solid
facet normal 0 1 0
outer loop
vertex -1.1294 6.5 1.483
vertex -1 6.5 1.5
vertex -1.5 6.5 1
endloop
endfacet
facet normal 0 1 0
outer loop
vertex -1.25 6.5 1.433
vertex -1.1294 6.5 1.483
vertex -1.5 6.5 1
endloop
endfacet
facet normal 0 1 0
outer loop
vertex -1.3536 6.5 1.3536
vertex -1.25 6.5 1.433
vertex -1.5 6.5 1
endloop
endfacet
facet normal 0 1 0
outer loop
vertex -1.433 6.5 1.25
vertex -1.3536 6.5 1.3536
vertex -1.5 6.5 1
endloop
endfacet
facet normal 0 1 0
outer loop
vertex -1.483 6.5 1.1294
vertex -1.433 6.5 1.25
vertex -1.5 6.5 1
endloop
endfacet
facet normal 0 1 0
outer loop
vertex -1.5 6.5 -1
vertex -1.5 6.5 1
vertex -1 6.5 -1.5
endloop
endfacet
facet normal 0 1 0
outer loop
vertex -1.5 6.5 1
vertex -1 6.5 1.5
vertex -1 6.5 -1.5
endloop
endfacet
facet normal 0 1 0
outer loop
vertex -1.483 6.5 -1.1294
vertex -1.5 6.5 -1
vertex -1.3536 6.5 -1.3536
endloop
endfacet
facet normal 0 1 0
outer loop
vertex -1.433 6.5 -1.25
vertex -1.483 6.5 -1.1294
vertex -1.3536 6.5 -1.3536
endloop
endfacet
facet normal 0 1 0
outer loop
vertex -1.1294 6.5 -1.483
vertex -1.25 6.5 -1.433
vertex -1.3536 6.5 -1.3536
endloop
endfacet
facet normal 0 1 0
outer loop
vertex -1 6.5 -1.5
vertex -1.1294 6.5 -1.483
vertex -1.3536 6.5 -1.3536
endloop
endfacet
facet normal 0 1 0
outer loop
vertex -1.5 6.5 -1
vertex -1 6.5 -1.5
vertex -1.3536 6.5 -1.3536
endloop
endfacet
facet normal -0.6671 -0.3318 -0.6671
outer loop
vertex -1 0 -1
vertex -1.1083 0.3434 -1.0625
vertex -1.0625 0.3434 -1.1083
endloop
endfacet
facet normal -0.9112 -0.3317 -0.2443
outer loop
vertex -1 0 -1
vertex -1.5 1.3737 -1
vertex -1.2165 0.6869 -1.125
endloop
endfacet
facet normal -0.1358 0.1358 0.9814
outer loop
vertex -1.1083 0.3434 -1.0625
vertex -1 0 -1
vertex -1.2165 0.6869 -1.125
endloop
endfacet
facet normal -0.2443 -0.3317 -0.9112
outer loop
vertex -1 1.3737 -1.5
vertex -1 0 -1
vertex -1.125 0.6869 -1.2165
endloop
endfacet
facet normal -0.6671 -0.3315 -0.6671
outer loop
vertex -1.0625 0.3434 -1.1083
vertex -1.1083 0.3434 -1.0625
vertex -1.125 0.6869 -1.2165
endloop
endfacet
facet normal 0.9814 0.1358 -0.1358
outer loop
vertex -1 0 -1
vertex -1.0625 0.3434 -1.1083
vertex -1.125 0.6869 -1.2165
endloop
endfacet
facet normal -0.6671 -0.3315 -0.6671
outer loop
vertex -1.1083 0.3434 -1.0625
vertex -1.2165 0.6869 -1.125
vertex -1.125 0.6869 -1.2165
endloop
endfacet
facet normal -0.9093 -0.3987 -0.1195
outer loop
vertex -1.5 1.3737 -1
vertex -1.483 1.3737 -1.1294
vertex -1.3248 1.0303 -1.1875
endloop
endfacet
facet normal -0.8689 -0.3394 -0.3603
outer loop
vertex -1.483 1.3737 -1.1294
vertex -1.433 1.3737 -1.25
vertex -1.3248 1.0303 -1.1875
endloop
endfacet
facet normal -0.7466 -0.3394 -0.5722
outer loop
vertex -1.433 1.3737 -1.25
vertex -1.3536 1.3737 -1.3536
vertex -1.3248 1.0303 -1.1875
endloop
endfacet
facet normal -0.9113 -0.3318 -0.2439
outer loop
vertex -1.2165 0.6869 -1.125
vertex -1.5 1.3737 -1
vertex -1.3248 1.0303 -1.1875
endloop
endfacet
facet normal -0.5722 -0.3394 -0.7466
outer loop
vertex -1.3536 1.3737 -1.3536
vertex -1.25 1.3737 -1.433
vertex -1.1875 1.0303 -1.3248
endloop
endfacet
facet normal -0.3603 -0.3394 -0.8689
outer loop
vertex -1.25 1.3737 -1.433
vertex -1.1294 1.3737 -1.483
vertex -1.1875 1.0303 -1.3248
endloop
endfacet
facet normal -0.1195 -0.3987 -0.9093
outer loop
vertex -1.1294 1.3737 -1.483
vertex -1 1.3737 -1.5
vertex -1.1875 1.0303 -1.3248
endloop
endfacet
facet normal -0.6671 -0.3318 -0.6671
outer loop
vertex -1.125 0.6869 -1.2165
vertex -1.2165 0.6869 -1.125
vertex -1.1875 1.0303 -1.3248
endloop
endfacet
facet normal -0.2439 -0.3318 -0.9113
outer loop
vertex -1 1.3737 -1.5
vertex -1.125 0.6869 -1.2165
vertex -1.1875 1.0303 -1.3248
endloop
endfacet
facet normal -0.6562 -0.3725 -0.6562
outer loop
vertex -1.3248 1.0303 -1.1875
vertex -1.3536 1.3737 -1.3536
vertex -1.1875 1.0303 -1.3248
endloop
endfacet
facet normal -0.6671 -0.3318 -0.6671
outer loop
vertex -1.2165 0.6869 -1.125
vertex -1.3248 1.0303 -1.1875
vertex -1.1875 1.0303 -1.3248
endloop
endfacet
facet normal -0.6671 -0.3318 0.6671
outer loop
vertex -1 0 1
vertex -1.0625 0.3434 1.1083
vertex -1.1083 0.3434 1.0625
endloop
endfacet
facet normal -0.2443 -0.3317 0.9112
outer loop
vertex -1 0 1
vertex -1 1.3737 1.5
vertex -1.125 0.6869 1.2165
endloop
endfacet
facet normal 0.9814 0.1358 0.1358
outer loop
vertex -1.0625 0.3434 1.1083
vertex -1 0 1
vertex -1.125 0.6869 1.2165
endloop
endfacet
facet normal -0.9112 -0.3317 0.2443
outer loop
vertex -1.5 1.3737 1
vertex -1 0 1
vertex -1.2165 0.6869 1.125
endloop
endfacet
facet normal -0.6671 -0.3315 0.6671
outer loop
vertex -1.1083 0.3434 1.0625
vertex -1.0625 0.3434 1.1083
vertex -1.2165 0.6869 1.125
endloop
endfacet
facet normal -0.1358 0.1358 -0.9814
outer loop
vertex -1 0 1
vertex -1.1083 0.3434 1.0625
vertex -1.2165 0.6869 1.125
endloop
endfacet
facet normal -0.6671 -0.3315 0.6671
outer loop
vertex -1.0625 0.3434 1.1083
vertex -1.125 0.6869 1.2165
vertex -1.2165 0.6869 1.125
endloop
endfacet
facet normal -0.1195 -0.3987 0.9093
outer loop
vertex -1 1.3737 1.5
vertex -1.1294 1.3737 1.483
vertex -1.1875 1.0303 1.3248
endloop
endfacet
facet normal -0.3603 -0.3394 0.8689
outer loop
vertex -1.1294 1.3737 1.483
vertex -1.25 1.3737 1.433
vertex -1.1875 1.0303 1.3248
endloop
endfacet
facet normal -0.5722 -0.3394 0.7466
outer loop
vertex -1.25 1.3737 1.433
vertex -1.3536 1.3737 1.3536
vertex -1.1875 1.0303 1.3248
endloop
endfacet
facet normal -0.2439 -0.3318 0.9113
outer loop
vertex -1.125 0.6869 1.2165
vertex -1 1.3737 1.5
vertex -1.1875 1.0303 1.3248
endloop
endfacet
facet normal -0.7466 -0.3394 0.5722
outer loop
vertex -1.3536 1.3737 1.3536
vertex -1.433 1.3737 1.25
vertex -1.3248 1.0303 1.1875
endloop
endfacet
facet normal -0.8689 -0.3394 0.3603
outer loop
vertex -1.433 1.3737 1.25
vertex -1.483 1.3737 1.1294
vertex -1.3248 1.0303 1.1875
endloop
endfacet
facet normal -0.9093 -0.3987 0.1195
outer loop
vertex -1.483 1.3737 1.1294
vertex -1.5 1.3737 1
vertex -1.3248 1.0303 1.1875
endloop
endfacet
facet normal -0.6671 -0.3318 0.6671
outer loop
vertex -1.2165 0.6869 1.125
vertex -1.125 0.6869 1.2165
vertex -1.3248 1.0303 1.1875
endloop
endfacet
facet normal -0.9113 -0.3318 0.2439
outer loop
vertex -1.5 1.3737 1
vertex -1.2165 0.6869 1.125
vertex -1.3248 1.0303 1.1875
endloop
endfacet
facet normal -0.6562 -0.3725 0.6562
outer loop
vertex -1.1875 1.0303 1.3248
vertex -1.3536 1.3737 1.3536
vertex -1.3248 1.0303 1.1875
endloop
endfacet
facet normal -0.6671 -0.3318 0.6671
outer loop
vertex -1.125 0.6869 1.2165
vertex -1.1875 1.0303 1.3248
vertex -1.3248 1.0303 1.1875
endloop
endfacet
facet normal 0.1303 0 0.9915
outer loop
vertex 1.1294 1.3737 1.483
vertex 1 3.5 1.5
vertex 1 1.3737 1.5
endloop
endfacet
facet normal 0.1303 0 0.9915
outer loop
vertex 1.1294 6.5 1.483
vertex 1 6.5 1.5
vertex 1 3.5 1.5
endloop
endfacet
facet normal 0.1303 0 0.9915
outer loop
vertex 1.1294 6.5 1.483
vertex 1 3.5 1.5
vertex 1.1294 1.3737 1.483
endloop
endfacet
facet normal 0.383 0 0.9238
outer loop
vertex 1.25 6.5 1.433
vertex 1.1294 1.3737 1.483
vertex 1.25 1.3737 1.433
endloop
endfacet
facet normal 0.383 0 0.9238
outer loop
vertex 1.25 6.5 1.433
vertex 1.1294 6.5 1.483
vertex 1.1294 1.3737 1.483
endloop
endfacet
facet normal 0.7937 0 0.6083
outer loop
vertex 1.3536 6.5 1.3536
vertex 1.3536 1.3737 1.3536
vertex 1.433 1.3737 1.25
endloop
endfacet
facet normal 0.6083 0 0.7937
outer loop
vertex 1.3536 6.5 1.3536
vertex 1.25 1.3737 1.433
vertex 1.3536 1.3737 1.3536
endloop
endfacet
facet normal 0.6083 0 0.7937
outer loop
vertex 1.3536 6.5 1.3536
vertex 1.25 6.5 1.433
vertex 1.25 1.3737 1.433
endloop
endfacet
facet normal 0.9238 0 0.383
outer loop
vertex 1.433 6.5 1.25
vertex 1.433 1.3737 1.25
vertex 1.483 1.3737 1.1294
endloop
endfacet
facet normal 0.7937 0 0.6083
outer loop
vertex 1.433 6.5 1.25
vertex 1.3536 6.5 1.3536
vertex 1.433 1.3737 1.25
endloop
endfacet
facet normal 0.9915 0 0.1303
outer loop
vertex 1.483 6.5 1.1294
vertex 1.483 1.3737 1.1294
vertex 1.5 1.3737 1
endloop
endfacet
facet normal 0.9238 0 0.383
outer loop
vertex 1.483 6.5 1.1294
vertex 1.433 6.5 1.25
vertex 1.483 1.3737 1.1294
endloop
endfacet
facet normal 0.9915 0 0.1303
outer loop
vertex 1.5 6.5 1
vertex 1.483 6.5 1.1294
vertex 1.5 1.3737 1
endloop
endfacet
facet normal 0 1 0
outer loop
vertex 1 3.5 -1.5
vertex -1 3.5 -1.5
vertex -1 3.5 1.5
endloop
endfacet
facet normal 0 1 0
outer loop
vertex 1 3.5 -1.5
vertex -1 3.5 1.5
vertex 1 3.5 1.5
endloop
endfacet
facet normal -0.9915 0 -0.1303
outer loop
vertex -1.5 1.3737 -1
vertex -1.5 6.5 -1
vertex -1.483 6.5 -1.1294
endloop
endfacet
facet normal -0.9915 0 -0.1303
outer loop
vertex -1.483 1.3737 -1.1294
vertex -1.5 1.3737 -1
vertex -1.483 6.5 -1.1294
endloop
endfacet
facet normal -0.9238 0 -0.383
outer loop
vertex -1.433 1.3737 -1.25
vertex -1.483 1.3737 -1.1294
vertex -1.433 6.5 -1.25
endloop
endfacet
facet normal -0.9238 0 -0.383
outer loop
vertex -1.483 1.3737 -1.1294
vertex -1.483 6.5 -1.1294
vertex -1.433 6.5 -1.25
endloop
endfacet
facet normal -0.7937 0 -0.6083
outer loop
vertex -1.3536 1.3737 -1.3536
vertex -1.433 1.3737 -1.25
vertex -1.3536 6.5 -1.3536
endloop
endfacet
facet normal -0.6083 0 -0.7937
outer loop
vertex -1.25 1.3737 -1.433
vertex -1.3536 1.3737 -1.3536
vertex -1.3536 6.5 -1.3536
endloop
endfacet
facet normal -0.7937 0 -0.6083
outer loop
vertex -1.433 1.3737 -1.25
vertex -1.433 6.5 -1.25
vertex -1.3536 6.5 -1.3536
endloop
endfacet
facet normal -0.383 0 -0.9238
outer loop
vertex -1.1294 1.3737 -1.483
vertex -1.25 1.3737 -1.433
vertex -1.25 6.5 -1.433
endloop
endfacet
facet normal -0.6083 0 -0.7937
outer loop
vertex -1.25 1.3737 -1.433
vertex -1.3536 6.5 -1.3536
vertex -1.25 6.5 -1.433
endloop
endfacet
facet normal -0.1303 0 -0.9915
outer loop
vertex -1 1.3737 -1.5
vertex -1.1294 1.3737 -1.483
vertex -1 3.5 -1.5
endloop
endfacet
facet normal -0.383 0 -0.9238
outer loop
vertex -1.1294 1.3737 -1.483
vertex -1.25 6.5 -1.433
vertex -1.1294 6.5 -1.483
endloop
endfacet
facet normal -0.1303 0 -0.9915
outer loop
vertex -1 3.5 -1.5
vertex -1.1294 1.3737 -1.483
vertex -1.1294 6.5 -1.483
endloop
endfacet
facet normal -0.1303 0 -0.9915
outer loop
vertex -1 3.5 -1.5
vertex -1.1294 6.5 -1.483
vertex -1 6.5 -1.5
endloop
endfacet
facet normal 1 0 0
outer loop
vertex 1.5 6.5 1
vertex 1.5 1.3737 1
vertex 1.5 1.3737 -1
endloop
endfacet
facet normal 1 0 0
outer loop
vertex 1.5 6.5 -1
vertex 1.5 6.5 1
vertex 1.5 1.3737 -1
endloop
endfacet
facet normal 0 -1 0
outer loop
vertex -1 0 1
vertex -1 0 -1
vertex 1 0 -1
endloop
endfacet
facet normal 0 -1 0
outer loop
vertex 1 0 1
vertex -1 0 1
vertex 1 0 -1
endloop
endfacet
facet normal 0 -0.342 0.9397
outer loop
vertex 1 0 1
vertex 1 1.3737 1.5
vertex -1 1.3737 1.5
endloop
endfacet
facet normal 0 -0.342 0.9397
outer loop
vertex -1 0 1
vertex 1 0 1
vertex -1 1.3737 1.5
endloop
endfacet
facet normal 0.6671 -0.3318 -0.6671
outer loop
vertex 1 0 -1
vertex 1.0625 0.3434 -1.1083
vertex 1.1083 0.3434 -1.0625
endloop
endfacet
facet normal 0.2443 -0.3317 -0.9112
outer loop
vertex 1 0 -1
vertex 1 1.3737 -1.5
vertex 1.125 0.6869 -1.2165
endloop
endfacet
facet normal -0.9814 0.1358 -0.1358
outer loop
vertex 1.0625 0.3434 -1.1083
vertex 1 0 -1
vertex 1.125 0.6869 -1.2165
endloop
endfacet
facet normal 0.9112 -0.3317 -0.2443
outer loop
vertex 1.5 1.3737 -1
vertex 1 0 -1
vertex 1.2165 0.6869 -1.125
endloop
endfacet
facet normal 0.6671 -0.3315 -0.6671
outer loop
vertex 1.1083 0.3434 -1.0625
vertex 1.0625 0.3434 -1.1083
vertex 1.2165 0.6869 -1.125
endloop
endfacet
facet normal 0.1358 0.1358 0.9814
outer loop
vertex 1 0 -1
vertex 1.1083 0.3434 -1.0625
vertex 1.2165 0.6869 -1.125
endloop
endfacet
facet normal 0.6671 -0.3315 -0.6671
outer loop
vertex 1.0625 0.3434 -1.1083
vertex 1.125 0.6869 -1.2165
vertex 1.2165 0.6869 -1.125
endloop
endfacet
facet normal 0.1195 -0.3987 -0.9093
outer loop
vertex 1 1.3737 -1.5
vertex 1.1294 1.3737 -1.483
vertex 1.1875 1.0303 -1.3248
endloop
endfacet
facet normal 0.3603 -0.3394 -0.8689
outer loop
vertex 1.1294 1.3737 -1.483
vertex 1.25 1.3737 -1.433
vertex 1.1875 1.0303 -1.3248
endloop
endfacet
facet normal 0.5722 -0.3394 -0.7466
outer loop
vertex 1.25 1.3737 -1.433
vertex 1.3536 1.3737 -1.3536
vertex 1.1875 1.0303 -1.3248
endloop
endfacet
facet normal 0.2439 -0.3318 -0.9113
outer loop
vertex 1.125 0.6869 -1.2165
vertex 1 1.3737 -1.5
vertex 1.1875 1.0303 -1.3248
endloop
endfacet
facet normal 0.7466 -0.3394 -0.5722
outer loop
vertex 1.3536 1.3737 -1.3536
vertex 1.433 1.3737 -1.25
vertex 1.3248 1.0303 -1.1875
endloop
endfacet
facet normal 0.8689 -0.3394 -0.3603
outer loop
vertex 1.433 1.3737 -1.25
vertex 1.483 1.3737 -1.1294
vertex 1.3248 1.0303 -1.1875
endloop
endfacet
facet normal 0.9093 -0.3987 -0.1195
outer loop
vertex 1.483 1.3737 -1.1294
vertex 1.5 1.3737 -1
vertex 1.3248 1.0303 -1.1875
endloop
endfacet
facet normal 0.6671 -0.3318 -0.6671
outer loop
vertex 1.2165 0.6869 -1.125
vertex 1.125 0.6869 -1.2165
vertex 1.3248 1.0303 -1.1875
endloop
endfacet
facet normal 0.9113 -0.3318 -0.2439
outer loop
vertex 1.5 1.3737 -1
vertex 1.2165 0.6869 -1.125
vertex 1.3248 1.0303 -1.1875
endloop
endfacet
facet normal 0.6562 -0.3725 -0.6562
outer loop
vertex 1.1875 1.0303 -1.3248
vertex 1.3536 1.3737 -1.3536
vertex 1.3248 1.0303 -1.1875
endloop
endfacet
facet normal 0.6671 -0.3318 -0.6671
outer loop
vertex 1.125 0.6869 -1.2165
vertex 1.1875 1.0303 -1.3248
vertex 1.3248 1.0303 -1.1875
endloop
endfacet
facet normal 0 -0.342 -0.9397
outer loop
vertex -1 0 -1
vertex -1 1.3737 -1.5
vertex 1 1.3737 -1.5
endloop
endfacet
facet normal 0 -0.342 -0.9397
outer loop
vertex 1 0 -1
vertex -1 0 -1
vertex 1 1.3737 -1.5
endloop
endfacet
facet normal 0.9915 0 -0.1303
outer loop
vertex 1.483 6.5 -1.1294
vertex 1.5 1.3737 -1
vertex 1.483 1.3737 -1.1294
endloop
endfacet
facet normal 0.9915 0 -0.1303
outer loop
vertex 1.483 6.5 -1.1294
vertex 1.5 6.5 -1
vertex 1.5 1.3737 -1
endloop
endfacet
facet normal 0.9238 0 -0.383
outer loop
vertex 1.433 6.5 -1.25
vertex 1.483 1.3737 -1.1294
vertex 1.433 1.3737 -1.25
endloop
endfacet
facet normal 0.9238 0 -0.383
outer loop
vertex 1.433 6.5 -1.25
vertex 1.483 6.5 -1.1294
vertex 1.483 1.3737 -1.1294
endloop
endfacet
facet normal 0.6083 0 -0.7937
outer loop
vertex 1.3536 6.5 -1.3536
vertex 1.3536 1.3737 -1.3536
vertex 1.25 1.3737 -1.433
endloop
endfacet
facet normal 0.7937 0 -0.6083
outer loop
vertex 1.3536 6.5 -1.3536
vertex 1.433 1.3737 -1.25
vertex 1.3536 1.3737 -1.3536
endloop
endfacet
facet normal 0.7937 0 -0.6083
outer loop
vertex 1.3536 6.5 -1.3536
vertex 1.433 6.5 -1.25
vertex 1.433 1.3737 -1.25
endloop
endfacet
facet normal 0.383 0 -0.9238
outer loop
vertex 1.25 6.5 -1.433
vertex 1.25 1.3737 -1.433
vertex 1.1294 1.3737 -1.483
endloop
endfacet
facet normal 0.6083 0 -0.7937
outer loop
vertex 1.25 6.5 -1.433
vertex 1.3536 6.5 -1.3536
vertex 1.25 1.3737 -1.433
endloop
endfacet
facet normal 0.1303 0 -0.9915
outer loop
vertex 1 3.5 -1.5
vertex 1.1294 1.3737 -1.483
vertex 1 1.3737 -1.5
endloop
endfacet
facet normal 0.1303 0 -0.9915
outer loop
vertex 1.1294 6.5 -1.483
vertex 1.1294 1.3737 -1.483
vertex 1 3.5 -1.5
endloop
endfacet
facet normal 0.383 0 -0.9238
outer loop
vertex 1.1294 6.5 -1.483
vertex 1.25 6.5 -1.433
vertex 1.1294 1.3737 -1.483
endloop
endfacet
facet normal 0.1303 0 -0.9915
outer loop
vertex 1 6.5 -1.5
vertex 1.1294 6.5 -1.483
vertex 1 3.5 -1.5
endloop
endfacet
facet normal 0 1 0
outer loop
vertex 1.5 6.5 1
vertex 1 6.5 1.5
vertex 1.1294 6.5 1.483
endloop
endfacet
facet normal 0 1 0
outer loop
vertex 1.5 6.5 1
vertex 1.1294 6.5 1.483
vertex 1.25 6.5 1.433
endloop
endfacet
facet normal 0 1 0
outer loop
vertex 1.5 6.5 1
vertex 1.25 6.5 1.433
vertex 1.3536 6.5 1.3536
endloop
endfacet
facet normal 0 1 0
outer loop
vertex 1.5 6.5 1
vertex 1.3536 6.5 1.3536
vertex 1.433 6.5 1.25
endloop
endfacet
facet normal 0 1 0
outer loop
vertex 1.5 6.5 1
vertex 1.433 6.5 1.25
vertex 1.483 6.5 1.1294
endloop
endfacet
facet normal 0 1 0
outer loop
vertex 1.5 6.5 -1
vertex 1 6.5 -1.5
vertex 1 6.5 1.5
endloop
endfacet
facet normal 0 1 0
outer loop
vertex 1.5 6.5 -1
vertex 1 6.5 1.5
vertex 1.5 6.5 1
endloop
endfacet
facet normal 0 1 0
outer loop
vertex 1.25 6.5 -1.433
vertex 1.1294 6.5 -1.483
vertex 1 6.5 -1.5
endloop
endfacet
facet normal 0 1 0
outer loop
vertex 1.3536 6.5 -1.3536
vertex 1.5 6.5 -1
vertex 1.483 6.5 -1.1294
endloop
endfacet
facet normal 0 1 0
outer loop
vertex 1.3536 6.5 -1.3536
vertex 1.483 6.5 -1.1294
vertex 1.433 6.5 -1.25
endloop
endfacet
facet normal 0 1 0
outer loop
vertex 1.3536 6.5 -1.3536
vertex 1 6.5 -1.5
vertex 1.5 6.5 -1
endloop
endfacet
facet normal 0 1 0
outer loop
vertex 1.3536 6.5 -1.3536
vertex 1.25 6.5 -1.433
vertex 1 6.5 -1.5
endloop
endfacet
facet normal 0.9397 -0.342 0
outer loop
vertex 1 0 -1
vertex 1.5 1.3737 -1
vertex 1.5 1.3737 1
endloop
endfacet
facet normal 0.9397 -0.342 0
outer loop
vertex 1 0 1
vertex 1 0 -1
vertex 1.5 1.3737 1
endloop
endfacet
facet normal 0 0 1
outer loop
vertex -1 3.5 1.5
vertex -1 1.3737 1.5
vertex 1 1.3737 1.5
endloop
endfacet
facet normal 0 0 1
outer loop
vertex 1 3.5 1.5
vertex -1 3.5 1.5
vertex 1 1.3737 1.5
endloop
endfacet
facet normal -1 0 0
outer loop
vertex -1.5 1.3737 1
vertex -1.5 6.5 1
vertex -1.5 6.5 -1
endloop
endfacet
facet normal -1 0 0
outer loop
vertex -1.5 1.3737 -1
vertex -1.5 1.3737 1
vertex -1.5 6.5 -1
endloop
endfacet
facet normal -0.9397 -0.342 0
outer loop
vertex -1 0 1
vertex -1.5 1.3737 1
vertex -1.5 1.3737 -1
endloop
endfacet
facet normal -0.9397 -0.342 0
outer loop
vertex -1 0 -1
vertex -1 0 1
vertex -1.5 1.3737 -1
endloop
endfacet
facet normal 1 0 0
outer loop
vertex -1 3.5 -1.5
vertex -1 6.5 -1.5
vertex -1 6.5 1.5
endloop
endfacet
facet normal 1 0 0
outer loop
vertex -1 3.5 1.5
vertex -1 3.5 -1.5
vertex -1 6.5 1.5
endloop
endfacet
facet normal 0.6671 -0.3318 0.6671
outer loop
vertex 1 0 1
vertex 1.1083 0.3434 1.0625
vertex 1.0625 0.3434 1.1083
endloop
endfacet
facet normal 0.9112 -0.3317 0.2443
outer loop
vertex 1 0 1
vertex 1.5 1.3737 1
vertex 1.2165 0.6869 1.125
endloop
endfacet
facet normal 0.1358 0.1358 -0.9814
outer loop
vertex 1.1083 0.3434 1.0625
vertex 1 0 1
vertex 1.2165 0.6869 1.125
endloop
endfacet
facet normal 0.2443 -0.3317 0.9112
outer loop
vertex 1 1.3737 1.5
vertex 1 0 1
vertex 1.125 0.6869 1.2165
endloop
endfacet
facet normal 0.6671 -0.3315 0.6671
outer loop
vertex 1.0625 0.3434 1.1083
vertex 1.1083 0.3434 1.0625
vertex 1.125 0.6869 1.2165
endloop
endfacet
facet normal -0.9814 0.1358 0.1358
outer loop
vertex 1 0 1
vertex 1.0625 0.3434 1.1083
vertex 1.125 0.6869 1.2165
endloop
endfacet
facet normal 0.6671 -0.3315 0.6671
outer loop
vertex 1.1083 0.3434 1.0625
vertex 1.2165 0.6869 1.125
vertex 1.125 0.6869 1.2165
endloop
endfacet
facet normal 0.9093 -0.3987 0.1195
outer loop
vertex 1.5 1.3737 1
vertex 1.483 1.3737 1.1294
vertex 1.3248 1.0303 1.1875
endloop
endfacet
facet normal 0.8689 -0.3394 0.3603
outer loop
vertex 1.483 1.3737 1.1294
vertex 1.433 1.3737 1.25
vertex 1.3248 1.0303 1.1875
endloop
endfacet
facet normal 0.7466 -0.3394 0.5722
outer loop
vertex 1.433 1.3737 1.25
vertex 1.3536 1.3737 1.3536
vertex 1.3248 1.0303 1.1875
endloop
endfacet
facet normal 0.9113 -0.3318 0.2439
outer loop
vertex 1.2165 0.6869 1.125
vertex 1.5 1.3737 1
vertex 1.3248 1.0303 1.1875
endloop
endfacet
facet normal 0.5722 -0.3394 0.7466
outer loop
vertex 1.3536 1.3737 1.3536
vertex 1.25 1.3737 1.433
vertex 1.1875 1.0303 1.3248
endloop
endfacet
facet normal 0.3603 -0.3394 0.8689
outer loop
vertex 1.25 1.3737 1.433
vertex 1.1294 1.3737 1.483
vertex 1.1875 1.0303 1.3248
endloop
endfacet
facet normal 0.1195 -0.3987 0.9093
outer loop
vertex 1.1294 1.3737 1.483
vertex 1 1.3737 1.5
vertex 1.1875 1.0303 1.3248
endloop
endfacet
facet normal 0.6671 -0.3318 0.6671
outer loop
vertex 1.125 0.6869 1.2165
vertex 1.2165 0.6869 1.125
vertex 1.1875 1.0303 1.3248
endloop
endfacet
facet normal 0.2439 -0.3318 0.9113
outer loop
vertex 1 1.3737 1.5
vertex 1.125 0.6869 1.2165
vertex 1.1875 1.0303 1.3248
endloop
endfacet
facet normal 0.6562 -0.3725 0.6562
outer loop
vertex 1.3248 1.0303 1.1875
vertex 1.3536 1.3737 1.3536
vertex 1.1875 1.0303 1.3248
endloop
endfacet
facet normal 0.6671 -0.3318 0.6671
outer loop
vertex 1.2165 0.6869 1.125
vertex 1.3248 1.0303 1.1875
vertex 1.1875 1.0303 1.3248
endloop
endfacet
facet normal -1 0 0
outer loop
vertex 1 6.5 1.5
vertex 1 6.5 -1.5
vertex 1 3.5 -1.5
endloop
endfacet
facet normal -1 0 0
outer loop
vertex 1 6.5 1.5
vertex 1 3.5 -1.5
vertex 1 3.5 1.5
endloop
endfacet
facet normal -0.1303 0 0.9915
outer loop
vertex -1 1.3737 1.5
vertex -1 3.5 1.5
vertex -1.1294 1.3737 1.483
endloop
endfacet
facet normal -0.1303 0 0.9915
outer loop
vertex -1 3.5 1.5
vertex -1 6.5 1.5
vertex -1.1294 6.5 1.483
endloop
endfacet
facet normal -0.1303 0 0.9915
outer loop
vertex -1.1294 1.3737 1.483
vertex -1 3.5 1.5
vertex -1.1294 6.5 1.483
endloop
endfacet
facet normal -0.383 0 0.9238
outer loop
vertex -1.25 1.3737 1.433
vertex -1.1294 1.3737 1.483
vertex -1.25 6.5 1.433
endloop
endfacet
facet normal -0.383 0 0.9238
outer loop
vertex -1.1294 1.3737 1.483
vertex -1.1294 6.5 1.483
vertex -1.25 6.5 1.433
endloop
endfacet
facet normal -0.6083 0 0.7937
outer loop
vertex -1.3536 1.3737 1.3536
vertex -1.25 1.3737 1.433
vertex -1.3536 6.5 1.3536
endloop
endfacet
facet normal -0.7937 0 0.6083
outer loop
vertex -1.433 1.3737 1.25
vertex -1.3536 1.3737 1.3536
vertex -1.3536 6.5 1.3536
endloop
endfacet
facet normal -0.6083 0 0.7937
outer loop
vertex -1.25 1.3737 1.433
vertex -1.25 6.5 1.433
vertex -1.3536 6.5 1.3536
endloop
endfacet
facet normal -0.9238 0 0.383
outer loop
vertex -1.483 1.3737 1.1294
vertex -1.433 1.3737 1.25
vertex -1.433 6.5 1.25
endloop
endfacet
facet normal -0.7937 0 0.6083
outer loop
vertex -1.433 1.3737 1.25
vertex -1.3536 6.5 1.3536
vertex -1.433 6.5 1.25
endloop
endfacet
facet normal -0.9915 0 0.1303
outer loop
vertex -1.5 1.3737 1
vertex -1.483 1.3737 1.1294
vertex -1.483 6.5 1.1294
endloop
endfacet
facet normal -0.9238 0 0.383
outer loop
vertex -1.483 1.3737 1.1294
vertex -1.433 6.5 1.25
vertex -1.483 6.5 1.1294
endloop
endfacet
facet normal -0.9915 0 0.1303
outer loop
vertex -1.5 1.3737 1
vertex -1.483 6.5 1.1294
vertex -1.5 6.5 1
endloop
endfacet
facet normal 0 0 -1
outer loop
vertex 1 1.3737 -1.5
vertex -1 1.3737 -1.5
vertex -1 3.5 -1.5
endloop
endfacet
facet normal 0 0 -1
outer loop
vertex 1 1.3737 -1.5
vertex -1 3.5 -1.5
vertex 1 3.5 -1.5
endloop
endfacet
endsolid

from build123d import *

# Parameters (mm, degrees)
SKETCH1_W           = 3
SKETCH1_H           = 3
BOSS_EXTRUDE1_DEPTH = 3.5
FILLET1_R           = 0.5
CHAMFER1_SIZE       = 0.5
CHAMFER1_SIZE2      = 1.37373871
BOSS_EXTRUDE2_START = 3
BOSS_EXTRUDE2_DEPTH = 3


with BuildPart() as part:
    # Sketch1 → Boss-Extrude1 (new body)
    with BuildSketch(Plane(origin=(0, 0, 0), x_dir=(1, 0, 0), z_dir=(0, 1, 0))):
        Rectangle(SKETCH1_W, SKETCH1_H)
    extrude(amount=BOSS_EXTRUDE1_DEPTH)

    # Fillet1
    fillet1_edges = [part.edges().sort_by_distance(p)[0] for p in [
        (-1.5, 1.75, -1.5),
        (1.5, 1.75, -1.5),
        (1.5, 1.75, 1.5),
        (-1.5, 1.75, 1.5),
    ]]
    fillet(fillet1_edges, radius=FILLET1_R)

    # Chamfer1
    chamfer1_edges = [part.edges().sort_by_distance(p)[0] for p in [
        (-1.5, 0, 0),
        (0, 0, -1.5),
        (1.5, 0, 0),
        (0, 0, 1.5),
        (1.353553391, 0, 1.353553391),
        (-1.353553391, 0, 1.353553391),
        (1.353553391, 0, -1.353553391),
        (-1.353553391, 0, -1.353553391),
    ]]
    chamfer1_side = [part.faces().sort_by_distance(p)[0] for p in [
        (0, 0, 0),
    ]]
    chamfer(chamfer1_edges, length=CHAMFER1_SIZE, length2=CHAMFER1_SIZE2, reference=chamfer1_side[0])

    # Sketch2 → Boss-Extrude2 (add)
    with BuildSketch(Plane(origin=(0, 3.5, 0), x_dir=(1, 0, 0), z_dir=(0, 1, 0)).offset(BOSS_EXTRUDE2_START)):
        with BuildLine():
            Line((-1, 1.5), (-1, -1.5))
            ThreePointArc((-1, -1.5), (-1.353553391, -1.353553391), (-1.5, -1))
            Line((-1.5, -1), (-1.5, 1))
            ThreePointArc((-1.5, 1), (-1.353553391, 1.353553391), (-1, 1.5))
        make_face()
        with BuildLine():
            Line((1.5, -1), (1.5, 1))
            ThreePointArc((1.5, 1), (1.353553391, 1.353553391), (1, 1.5))
            Line((1, 1.5), (1, -1.5))
            ThreePointArc((1, -1.5), (1.353553391, -1.353553391), (1.5, -1))
        make_face()
    extrude(amount=-BOSS_EXTRUDE2_DEPTH)


solid = part.part
